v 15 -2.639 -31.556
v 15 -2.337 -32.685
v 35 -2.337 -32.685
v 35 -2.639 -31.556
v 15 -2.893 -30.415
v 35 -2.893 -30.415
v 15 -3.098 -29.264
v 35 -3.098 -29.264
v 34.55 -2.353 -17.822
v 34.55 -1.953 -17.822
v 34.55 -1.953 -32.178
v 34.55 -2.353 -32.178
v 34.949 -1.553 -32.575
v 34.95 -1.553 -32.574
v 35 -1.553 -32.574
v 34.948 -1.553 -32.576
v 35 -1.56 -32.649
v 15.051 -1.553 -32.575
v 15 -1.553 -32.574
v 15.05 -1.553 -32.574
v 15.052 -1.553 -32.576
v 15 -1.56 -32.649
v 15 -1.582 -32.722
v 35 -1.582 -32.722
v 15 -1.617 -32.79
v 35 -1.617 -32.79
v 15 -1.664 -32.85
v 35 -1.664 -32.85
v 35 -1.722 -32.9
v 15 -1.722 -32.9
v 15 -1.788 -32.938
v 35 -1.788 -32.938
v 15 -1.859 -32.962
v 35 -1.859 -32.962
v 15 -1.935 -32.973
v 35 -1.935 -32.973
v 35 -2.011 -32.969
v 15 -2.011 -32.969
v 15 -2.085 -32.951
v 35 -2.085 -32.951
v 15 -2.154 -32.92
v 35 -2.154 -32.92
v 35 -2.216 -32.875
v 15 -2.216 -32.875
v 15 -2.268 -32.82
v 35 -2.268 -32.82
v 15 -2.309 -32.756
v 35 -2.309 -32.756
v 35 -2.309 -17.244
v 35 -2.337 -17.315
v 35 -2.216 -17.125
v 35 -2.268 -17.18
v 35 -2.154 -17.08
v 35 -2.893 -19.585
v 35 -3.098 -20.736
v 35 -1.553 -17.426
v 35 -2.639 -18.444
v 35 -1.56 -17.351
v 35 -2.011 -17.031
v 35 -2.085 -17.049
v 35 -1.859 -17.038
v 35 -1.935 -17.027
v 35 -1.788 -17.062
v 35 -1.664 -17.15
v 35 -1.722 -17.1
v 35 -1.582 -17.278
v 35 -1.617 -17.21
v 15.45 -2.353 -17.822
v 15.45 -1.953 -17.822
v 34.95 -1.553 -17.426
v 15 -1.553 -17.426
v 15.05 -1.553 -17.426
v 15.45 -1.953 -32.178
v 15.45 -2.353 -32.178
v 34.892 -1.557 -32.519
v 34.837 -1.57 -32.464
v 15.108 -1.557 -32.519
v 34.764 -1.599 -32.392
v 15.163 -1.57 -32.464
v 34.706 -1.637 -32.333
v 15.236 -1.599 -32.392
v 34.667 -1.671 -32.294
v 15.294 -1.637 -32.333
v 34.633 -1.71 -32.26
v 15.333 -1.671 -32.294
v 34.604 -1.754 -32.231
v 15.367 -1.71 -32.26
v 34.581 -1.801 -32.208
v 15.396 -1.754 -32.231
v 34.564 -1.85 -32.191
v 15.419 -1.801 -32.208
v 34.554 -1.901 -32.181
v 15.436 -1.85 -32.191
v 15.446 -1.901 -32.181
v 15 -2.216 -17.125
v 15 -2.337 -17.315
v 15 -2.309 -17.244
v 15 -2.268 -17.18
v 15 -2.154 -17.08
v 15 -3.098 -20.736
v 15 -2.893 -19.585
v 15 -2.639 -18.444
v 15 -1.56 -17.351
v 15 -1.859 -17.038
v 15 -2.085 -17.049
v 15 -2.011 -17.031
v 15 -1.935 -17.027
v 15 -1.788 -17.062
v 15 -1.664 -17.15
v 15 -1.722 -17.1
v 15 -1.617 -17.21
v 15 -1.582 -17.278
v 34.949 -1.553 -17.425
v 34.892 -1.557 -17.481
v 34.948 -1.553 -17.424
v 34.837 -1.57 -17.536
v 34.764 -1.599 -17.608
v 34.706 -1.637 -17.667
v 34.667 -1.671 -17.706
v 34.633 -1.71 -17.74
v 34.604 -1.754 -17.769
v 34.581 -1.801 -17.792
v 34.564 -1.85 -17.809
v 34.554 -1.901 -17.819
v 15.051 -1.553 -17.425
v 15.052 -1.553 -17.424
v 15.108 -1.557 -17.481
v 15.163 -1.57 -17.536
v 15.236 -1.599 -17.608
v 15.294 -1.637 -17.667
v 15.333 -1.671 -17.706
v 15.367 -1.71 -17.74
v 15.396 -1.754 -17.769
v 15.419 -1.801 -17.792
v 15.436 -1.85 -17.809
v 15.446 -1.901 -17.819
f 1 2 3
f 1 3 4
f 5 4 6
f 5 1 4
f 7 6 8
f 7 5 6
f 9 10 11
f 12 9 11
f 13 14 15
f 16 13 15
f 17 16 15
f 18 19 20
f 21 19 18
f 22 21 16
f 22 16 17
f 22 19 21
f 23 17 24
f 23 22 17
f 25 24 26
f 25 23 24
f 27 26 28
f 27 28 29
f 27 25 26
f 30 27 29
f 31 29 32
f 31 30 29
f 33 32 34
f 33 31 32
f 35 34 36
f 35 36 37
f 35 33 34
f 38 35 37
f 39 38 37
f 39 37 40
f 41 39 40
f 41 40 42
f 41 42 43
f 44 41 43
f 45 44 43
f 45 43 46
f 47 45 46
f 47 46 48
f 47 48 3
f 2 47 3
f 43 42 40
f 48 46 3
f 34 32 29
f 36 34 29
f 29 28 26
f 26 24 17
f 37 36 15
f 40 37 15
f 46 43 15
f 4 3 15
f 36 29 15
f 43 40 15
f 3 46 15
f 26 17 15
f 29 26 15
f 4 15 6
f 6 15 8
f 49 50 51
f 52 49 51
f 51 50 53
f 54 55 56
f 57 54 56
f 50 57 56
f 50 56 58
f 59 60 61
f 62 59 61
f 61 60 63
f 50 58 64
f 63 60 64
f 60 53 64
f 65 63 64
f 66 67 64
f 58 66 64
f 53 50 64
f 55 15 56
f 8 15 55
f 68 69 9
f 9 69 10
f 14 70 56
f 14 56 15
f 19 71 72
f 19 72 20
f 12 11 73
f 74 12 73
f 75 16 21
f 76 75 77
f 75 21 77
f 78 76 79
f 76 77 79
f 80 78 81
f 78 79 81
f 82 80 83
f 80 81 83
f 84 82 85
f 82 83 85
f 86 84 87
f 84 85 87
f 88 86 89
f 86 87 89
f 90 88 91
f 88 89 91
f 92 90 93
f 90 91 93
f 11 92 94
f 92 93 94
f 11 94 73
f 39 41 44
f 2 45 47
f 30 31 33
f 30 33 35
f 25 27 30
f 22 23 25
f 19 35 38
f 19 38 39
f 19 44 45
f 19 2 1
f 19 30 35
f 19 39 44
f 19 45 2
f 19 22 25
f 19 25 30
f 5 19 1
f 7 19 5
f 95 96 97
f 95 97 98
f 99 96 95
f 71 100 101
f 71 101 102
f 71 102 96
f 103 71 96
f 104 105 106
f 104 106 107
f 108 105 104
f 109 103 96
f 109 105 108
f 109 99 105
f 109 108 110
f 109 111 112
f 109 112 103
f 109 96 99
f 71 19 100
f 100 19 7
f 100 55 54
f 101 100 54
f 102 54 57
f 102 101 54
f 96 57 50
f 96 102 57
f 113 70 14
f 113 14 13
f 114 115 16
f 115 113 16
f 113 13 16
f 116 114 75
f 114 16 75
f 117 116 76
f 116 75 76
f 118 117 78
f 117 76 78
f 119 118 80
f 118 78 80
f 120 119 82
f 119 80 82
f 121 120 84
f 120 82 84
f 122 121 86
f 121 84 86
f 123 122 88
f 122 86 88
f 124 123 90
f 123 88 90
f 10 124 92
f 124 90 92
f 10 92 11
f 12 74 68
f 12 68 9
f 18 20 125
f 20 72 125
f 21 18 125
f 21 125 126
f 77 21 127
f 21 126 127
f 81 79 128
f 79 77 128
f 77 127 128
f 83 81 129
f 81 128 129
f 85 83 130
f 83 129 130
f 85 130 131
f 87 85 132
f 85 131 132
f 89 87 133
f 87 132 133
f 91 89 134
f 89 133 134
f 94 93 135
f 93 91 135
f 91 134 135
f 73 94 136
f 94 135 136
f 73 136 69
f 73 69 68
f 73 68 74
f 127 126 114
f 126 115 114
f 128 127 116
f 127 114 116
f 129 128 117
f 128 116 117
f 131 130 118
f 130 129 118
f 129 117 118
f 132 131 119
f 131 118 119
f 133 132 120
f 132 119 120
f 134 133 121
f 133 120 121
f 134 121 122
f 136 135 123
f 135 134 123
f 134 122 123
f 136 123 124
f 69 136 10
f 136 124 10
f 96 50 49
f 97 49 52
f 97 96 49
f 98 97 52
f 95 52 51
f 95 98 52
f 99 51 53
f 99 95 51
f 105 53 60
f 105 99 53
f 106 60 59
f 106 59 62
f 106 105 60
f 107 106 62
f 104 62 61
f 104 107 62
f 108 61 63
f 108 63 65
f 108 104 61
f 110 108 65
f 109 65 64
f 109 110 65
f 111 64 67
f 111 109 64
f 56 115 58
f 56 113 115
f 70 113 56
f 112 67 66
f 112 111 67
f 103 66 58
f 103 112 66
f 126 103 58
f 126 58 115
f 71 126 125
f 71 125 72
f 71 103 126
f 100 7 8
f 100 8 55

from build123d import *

# Parameters (mm, degrees)
EXTRUDE_1_DEPTH     = 50
SKETCH_2_W          = 47.752029062465894
SKETCH_2_H          = 35.88941973747437
CUT_EXTRUDE_1_DEPTH = 2
FILLET_1_R          = 1
SCALE_1_SCALE       = 0.4


with BuildPart() as part:
    # 草图1 → 凸台-拉伸1 (new body)
    with BuildSketch(Plane(origin=(0, 0, 0), x_dir=(0, 0, -1), z_dir=(1, 0, 0))):
        with BuildLine():
            Line((6.066042211617314, 0), (43.933957788382685, 0))
            ThreePointArc((43.933957788382685, 0), (44.92401323811772, -0.85932233137432), (44.212515173340435, -1.9604195871000956))
            ThreePointArc((44.212515173340435, -1.9604195871000956), (39.96661362209007, -3.046903416934029), (35.66027972203156, -3.861529365825664))
            Line((35.66027972203156, -3.861529365825664), (14.339720277968421, -3.861529365825664))
            ThreePointArc((14.339720277968421, -3.861529365825664), (10.03338637790992, -3.046903416934029), (5.787484826659573, -1.9604195871000956))
            ThreePointArc((5.787484826659573, -1.9604195871000956), (5.075986761882271, -0.8593223313743236), (6.066042211617314, 0))
        make_face()
    extrude(amount=EXTRUDE_1_DEPTH)

    # 草图2 → 切除-拉伸1 (cut)
    with BuildSketch(Plane(origin=(0, 0, 0), x_dir=(1, 0, 0), z_dir=(0, 1, 0))):
        with Locations((25, 25.000000000000007)):
            Rectangle(SKETCH_2_W, SKETCH_2_H)
    extrude(amount=-CUT_EXTRUDE_1_DEPTH, mode=Mode.SUBTRACT)

    # 圆角1
    # the kernel refuses this fillet: 1 mm, written as the material it takes off along each edge
    with BuildSketch(Plane(origin=(1.1239854687670539, 0, -7.055290131262825), x_dir=(-1, 0, 0), z_dir=(0, 0, -1))) as fillet_1_piece_1:
        with BuildLine():
            CenterArc((FILLET_1_R, -FILLET_1_R), FILLET_1_R, 90, 90)
            Line((0, -FILLET_1_R), (-FILLET_1_R * 0.02, -FILLET_1_R))
            Line((-FILLET_1_R * 0.02, -FILLET_1_R), (-FILLET_1_R * 0.02, FILLET_1_R * 0.02))
            Line((-FILLET_1_R * 0.02, FILLET_1_R * 0.02), (FILLET_1_R, FILLET_1_R * 0.02))
            Line((FILLET_1_R, FILLET_1_R * 0.02), (FILLET_1_R, 0))
        make_face()
    extrude(amount=35.88941973747437, mode=Mode.SUBTRACT)
    with BuildSketch(Plane(origin=(48.87601453123295, 0, -7.055290131262825), x_dir=(0, 0, 1), z_dir=(-1, 0, 0))) as fillet_1_piece_2:
        with BuildLine():
            CenterArc((FILLET_1_R, -FILLET_1_R), FILLET_1_R, 90, 90)
            Line((0, -FILLET_1_R), (-FILLET_1_R * 0.02, -FILLET_1_R))
            Line((-FILLET_1_R * 0.02, -FILLET_1_R), (-FILLET_1_R * 0.02, FILLET_1_R * 0.02))
            Line((-FILLET_1_R * 0.02, FILLET_1_R * 0.02), (FILLET_1_R, FILLET_1_R * 0.02))
            Line((FILLET_1_R, FILLET_1_R * 0.02), (FILLET_1_R, 0))
        make_face()
    extrude(amount=47.752029062465894, mode=Mode.SUBTRACT)
    with BuildSketch(Plane(origin=(48.87601453123295, 0, -42.94470986873719), x_dir=(1, 0, 0), z_dir=(0, 0, 1))) as fillet_1_piece_3:
        with BuildLine():
            CenterArc((FILLET_1_R, -FILLET_1_R), FILLET_1_R, 90, 90)
            Line((0, -FILLET_1_R), (-FILLET_1_R * 0.02, -FILLET_1_R))
            Line((-FILLET_1_R * 0.02, -FILLET_1_R), (-FILLET_1_R * 0.02, FILLET_1_R * 0.02))
            Line((-FILLET_1_R * 0.02, FILLET_1_R * 0.02), (FILLET_1_R, FILLET_1_R * 0.02))
            Line((FILLET_1_R, FILLET_1_R * 0.02), (FILLET_1_R, 0))
        make_face()
    extrude(amount=35.88941973747437, mode=Mode.SUBTRACT)
    with BuildSketch(Plane(origin=(1.1239854687670539, 0, -42.94470986873719), x_dir=(0, 0, -1), z_dir=(1, 0, 0))) as fillet_1_piece_4:
        with BuildLine():
            CenterArc((FILLET_1_R, -FILLET_1_R), FILLET_1_R, 90, 90)
            Line((0, -FILLET_1_R), (-FILLET_1_R * 0.02, -FILLET_1_R))
            Line((-FILLET_1_R * 0.02, -FILLET_1_R), (-FILLET_1_R * 0.02, FILLET_1_R * 0.02))
            Line((-FILLET_1_R * 0.02, FILLET_1_R * 0.02), (FILLET_1_R, FILLET_1_R * 0.02))
            Line((FILLET_1_R, FILLET_1_R * 0.02), (FILLET_1_R, 0))
        make_face()
    extrude(amount=47.752029062465894, mode=Mode.SUBTRACT)
    with BuildSketch(Plane(origin=(1.1239854687670539, 0, -4.555290131262826), x_dir=(-1, 0, 0), z_dir=(0, 0, -1))) as fillet_1_piece_5a_section:
        with BuildLine():
            CenterArc((FILLET_1_R, -FILLET_1_R), FILLET_1_R, 90, 90)
            Line((0, -FILLET_1_R), (-FILLET_1_R * 0.02, -FILLET_1_R))
            Line((-FILLET_1_R * 0.02, -FILLET_1_R), (-FILLET_1_R * 0.02, FILLET_1_R * 0.02))
            Line((-FILLET_1_R * 0.02, FILLET_1_R * 0.02), (FILLET_1_R, FILLET_1_R * 0.02))
            Line((FILLET_1_R, FILLET_1_R * 0.02), (FILLET_1_R, 0))
        make_face()
    fillet_1_piece_5a = extrude(amount=38.38941973747437, mode=Mode.PRIVATE)
    fillet_1_piece_5a = split(fillet_1_piece_5a, bisect_by=Plane(origin=(0.8975903545002311, -0.2263951142668261, -7.055290131262825), z_dir=(0, 0, 1)), keep=Keep.TOP, mode=Mode.PRIVATE)
    with BuildSketch(Plane(origin=(48.87601453123295, 0, -7.055290131262825), x_dir=(0, 0, 1), z_dir=(-1, 0, 0))) as fillet_1_piece_5b_section:
        with BuildLine():
            CenterArc((FILLET_1_R, -FILLET_1_R), FILLET_1_R, 90, 90)
            Line((0, -FILLET_1_R), (-FILLET_1_R * 0.02, -FILLET_1_R))
            Line((-FILLET_1_R * 0.02, -FILLET_1_R), (-FILLET_1_R * 0.02, FILLET_1_R * 0.02))
            Line((-FILLET_1_R * 0.02, FILLET_1_R * 0.02), (FILLET_1_R, FILLET_1_R * 0.02))
            Line((FILLET_1_R, FILLET_1_R * 0.02), (FILLET_1_R, 0))
        make_face()
    fillet_1_piece_5b = extrude(amount=50.252029062465894, mode=Mode.PRIVATE)
    fillet_1_piece_5b = split(fillet_1_piece_5b, bisect_by=Plane(origin=(1.1239854687670539, -0.22639511426682482, -6.828895016995999), z_dir=(-1, 0, 0)), keep=Keep.TOP, mode=Mode.PRIVATE)
    fillet_1_piece_5 = fillet_1_piece_5a & fillet_1_piece_5b
    add(fillet_1_piece_5, mode=Mode.SUBTRACT)
    with BuildSketch(Plane(origin=(1.1239854687670539, 0, -7.055290131262825), x_dir=(-1, 0, 0), z_dir=(0, 0, -1))) as fillet_1_piece_6a_section:
        with BuildLine():
            CenterArc((FILLET_1_R, -FILLET_1_R), FILLET_1_R, 90, 90)
            Line((0, -FILLET_1_R), (-FILLET_1_R * 0.02, -FILLET_1_R))
            Line((-FILLET_1_R * 0.02, -FILLET_1_R), (-FILLET_1_R * 0.02, FILLET_1_R * 0.02))
            Line((-FILLET_1_R * 0.02, FILLET_1_R * 0.02), (FILLET_1_R, FILLET_1_R * 0.02))
            Line((FILLET_1_R, FILLET_1_R * 0.02), (FILLET_1_R, 0))
        make_face()
    fillet_1_piece_6a = extrude(amount=38.38941973747437, mode=Mode.PRIVATE)
    fillet_1_piece_6a = split(fillet_1_piece_6a, bisect_by=Plane(origin=(0.8975903545002285, -0.22639511426682538, -42.94470986873719), z_dir=(0, 0, -1)), keep=Keep.TOP, mode=Mode.PRIVATE)
    with BuildSketch(Plane(origin=(-1.3760145312329461, 0, -42.94470986873719), x_dir=(0, 0, -1), z_dir=(1, 0, 0))) as fillet_1_piece_6b_section:
        with BuildLine():
            CenterArc((FILLET_1_R, -FILLET_1_R), FILLET_1_R, 90, 90)
            Line((0, -FILLET_1_R), (-FILLET_1_R * 0.02, -FILLET_1_R))
            Line((-FILLET_1_R * 0.02, -FILLET_1_R), (-FILLET_1_R * 0.02, FILLET_1_R * 0.02))
            Line((-FILLET_1_R * 0.02, FILLET_1_R * 0.02), (FILLET_1_R, FILLET_1_R * 0.02))
            Line((FILLET_1_R, FILLET_1_R * 0.02), (FILLET_1_R, 0))
        make_face()
    fillet_1_piece_6b = extrude(amount=50.252029062465894, mode=Mode.PRIVATE)
    fillet_1_piece_6b = split(fillet_1_piece_6b, bisect_by=Plane(origin=(1.1239854687670539, -0.22639511426682907, -43.171104983004014), z_dir=(-1, 0, 0)), keep=Keep.TOP, mode=Mode.PRIVATE)
    fillet_1_piece_6 = fillet_1_piece_6a & fillet_1_piece_6b
    add(fillet_1_piece_6, mode=Mode.SUBTRACT)
    with BuildSketch(Plane(origin=(51.37601453123295, 0, -7.055290131262825), x_dir=(0, 0, 1), z_dir=(-1, 0, 0))) as fillet_1_piece_7a_section:
        with BuildLine():
            CenterArc((FILLET_1_R, -FILLET_1_R), FILLET_1_R, 90, 90)
            Line((0, -FILLET_1_R), (-FILLET_1_R * 0.02, -FILLET_1_R))
            Line((-FILLET_1_R * 0.02, -FILLET_1_R), (-FILLET_1_R * 0.02, FILLET_1_R * 0.02))
            Line((-FILLET_1_R * 0.02, FILLET_1_R * 0.02), (FILLET_1_R, FILLET_1_R * 0.02))
            Line((FILLET_1_R, FILLET_1_R * 0.02), (FILLET_1_R, 0))
        make_face()
    fillet_1_piece_7a = extrude(amount=50.252029062465894, mode=Mode.PRIVATE)
    fillet_1_piece_7a = split(fillet_1_piece_7a, bisect_by=Plane(origin=(48.87601453123295, -0.22639511426682557, -6.828895016996), z_dir=(1, 0, 0)), keep=Keep.TOP, mode=Mode.PRIVATE)
    with BuildSketch(Plane(origin=(48.87601453123295, 0, -42.94470986873719), x_dir=(1, 0, 0), z_dir=(0, 0, 1))) as fillet_1_piece_7b_section:
        with BuildLine():
            CenterArc((FILLET_1_R, -FILLET_1_R), FILLET_1_R, 90, 90)
            Line((0, -FILLET_1_R), (-FILLET_1_R * 0.02, -FILLET_1_R))
            Line((-FILLET_1_R * 0.02, -FILLET_1_R), (-FILLET_1_R * 0.02, FILLET_1_R * 0.02))
            Line((-FILLET_1_R * 0.02, FILLET_1_R * 0.02), (FILLET_1_R, FILLET_1_R * 0.02))
            Line((FILLET_1_R, FILLET_1_R * 0.02), (FILLET_1_R, 0))
        make_face()
    fillet_1_piece_7b = extrude(amount=38.38941973747437, mode=Mode.PRIVATE)
    fillet_1_piece_7b = split(fillet_1_piece_7b, bisect_by=Plane(origin=(49.10240964549977, -0.22639511426682904, -7.055290131262825), z_dir=(0, 0, 1)), keep=Keep.TOP, mode=Mode.PRIVATE)
    fillet_1_piece_7 = fillet_1_piece_7a & fillet_1_piece_7b
    add(fillet_1_piece_7, mode=Mode.SUBTRACT)
    with BuildSketch(Plane(origin=(48.87601453123295, 0, -45.44470986873719), x_dir=(1, 0, 0), z_dir=(0, 0, 1))) as fillet_1_piece_8a_section:
        with BuildLine():
            CenterArc((FILLET_1_R, -FILLET_1_R), FILLET_1_R, 90, 90)
            Line((0, -FILLET_1_R), (-FILLET_1_R * 0.02, -FILLET_1_R))
            Line((-FILLET_1_R * 0.02, -FILLET_1_R), (-FILLET_1_R * 0.02, FILLET_1_R * 0.02))
            Line((-FILLET_1_R * 0.02, FILLET_1_R * 0.02), (FILLET_1_R, FILLET_1_R * 0.02))
            Line((FILLET_1_R, FILLET_1_R * 0.02), (FILLET_1_R, 0))
        make_face()
    fillet_1_piece_8a = extrude(amount=38.38941973747437, mode=Mode.PRIVATE)
    fillet_1_piece_8a = split(fillet_1_piece_8a, bisect_by=Plane(origin=(49.10240964549977, -0.2263951142668292, -42.94470986873719), z_dir=(0, 0, -1)), keep=Keep.TOP, mode=Mode.PRIVATE)
    with BuildSketch(Plane(origin=(1.1239854687670539, 0, -42.94470986873719), x_dir=(0, 0, -1), z_dir=(1, 0, 0))) as fillet_1_piece_8b_section:
        with BuildLine():
            CenterArc((FILLET_1_R, -FILLET_1_R), FILLET_1_R, 90, 90)
            Line((0, -FILLET_1_R), (-FILLET_1_R * 0.02, -FILLET_1_R))
            Line((-FILLET_1_R * 0.02, -FILLET_1_R), (-FILLET_1_R * 0.02, FILLET_1_R * 0.02))
            Line((-FILLET_1_R * 0.02, FILLET_1_R * 0.02), (FILLET_1_R, FILLET_1_R * 0.02))
            Line((FILLET_1_R, FILLET_1_R * 0.02), (FILLET_1_R, 0))
        make_face()
    fillet_1_piece_8b = extrude(amount=50.252029062465894, mode=Mode.PRIVATE)
    fillet_1_piece_8b = split(fillet_1_piece_8b, bisect_by=Plane(origin=(48.87601453123295, -0.22639511426682885, -43.17110498300402), z_dir=(1, 0, 0)), keep=Keep.TOP, mode=Mode.PRIVATE)
    fillet_1_piece_8 = fillet_1_piece_8a & fillet_1_piece_8b
    add(fillet_1_piece_8, mode=Mode.SUBTRACT)


with BuildPart() as part_1:
    # 缩放比例1: scaled about (25, -2.588659759, -25)
    add(part.part.scale(SCALE_1_SCALE).moved(Location((15, -1.5531958554, -15))))


solid = part_1.part
